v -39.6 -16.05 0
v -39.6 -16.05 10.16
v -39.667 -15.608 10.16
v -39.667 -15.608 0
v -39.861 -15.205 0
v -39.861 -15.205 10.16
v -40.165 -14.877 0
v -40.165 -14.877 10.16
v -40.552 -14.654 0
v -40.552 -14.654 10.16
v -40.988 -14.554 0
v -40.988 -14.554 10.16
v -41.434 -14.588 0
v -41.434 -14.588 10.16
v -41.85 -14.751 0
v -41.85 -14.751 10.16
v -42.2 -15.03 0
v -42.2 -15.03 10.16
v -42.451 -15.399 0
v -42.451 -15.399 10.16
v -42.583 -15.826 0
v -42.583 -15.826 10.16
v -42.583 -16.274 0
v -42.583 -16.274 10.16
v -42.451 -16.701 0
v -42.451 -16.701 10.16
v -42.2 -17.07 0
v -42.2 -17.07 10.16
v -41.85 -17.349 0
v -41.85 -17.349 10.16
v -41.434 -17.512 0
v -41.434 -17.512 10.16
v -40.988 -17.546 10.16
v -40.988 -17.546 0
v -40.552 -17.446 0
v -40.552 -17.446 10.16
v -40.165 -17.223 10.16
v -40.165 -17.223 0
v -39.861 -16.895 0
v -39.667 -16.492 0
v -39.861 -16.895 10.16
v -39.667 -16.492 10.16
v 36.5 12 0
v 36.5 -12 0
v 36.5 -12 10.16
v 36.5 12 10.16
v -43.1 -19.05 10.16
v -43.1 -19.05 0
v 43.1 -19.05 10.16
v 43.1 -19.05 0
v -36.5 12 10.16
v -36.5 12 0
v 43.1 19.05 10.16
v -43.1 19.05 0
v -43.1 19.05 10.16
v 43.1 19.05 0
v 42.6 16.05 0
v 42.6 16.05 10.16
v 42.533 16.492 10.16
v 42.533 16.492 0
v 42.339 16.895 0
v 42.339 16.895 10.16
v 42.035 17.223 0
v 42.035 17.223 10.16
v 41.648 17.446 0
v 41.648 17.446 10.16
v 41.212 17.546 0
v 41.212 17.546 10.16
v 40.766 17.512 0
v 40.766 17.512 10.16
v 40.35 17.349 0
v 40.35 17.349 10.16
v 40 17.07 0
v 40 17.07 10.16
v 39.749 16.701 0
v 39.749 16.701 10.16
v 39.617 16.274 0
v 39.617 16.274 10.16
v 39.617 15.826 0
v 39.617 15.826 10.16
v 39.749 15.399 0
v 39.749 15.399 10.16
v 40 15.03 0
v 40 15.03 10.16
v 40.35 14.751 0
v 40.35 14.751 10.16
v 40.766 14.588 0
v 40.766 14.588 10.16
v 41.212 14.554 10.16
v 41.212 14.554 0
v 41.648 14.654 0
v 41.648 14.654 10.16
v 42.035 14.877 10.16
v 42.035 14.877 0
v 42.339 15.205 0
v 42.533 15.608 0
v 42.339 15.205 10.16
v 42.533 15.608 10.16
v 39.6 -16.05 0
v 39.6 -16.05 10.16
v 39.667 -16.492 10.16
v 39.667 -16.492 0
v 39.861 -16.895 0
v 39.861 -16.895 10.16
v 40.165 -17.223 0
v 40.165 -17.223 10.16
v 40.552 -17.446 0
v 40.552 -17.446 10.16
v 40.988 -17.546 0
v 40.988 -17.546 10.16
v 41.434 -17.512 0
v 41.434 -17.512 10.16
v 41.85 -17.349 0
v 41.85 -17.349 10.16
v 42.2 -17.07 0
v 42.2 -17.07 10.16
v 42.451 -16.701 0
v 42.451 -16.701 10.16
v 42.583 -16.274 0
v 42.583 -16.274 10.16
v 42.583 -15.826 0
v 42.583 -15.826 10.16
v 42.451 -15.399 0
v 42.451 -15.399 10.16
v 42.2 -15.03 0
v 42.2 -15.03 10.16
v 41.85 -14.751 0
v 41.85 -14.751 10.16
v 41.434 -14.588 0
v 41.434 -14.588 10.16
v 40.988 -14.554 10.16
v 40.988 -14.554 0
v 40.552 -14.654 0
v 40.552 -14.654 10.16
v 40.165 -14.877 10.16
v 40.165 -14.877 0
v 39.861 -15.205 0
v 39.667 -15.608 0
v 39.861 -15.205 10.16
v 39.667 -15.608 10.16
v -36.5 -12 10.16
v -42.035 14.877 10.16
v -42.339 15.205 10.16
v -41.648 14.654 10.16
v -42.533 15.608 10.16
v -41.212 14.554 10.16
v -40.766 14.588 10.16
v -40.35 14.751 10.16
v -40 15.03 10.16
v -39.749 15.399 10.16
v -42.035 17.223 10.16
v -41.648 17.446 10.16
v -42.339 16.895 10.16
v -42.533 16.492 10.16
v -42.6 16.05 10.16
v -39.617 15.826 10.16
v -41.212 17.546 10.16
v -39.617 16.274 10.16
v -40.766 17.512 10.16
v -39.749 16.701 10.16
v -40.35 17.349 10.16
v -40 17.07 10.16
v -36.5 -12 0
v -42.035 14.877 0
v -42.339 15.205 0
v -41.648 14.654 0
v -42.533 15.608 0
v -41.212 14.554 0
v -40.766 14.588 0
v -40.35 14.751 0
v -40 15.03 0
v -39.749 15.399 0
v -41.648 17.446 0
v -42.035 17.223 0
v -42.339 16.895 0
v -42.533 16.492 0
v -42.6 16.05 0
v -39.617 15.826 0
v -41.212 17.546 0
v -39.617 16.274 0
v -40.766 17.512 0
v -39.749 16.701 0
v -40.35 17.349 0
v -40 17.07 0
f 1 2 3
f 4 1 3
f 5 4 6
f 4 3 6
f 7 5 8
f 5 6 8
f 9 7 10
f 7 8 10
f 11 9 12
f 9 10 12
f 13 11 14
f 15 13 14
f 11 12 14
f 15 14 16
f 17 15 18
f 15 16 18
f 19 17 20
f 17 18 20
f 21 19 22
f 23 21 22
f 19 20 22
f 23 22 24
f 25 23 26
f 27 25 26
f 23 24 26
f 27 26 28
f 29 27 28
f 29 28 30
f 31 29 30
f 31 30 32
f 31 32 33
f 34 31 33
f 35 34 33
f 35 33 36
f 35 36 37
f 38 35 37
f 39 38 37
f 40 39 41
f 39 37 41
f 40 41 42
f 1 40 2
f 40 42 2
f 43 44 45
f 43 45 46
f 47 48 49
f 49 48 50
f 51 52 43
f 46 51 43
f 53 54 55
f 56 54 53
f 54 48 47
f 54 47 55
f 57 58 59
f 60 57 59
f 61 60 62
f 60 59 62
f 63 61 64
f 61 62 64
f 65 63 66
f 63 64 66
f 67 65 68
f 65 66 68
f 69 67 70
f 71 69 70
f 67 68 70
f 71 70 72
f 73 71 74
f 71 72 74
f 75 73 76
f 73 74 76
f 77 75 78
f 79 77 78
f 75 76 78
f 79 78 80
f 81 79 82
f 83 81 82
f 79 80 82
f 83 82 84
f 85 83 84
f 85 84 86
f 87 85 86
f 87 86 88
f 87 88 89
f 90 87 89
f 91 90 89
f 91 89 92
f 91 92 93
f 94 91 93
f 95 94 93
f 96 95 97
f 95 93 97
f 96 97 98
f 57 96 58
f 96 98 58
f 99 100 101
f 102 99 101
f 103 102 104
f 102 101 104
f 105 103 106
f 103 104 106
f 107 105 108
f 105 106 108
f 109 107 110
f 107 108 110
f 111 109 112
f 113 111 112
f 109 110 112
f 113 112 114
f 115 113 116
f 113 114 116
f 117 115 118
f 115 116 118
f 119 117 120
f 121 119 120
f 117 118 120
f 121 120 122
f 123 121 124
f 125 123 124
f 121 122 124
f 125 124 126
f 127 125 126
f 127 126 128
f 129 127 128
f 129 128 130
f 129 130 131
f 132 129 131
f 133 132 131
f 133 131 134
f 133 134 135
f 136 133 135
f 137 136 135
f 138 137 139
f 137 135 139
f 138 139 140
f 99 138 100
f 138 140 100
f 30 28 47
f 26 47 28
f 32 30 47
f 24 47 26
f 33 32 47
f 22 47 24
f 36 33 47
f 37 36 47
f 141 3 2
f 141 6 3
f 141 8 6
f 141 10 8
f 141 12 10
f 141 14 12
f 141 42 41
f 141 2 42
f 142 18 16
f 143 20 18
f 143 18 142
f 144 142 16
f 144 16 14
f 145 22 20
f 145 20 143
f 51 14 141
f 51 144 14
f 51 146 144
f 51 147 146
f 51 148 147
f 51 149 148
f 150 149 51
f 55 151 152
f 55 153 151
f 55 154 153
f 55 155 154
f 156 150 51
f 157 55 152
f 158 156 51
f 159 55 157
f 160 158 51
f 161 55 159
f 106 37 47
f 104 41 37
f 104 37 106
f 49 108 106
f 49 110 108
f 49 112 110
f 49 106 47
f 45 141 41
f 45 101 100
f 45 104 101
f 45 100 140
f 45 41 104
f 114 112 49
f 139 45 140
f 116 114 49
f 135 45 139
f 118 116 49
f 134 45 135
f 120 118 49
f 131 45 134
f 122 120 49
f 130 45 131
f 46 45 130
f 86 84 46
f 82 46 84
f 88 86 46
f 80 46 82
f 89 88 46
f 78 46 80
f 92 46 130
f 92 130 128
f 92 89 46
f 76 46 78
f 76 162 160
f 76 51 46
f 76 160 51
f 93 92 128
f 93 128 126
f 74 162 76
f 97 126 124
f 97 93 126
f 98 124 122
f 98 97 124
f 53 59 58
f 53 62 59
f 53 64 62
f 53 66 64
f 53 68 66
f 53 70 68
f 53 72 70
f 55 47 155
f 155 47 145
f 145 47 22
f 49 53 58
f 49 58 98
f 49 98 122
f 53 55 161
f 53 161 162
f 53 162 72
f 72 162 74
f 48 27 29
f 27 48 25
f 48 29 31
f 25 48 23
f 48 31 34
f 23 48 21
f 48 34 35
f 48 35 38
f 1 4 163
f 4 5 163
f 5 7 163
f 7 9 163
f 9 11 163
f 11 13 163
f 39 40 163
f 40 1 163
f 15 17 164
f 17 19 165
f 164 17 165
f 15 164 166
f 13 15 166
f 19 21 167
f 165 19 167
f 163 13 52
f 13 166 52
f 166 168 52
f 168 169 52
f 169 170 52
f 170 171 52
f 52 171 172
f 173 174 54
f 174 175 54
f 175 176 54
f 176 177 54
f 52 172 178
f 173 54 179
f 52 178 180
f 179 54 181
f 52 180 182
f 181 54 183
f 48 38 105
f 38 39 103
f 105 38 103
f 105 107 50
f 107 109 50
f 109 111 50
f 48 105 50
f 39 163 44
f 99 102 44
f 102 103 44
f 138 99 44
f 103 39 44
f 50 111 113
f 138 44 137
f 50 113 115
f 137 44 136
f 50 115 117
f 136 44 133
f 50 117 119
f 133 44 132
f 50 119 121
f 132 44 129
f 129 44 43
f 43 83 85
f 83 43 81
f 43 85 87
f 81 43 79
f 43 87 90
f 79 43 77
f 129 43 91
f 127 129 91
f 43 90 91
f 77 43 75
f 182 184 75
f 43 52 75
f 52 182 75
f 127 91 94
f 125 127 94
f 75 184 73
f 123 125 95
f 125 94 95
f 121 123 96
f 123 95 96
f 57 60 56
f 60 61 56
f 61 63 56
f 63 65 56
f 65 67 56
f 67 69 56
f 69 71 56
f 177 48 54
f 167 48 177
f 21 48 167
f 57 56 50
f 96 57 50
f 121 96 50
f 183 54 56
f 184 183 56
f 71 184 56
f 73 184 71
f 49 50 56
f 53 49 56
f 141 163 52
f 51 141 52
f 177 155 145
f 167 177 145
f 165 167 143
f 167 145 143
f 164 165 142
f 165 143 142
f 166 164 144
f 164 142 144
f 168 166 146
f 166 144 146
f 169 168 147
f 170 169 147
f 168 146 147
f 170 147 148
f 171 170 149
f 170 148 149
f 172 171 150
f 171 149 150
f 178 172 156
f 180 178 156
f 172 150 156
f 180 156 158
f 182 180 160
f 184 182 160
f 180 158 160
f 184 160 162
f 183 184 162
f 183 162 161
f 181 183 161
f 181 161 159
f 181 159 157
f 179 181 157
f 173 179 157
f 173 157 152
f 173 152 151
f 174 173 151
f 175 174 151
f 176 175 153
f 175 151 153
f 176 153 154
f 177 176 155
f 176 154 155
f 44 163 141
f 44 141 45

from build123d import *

# Parameters (mm, degrees)
SKETCH1_W           = 86.199999926
SKETCH1_H           = 38.1
SKETCH1_W_2         = 73
SKETCH1_H_2         = 24
BOSS_EXTRUDE1_DEPTH = 10.16
SKETCH2_R           = 1.5
CUT_EXTRUDE1_DEPTH  = 10.16


with BuildPart() as part:
    # Sketch1 → Boss-Extrude1 (new body)
    with BuildSketch(Plane.XY):
        Rectangle(SKETCH1_W, SKETCH1_H)
        Rectangle(SKETCH1_W_2, SKETCH1_H_2, mode=Mode.SUBTRACT)
    extrude(amount=BOSS_EXTRUDE1_DEPTH)

    # Sketch2 → Cut-Extrude1 (cut)
    with BuildSketch(Plane.XY.offset(10.16)):
        with Locations((41.099999963, 16.05)):
            Circle(SKETCH2_R)
        with Locations(Location((-41.099999963, 16.05, 0), (0, 0, 180))):
            Circle(SKETCH2_R)
        with Locations((-41.099999963, -16.05)):
            Circle(SKETCH2_R)
        with Locations(Location((41.099999963, -16.05, 0), (0, 0, 180))):
            Circle(SKETCH2_R)
    extrude(amount=-CUT_EXTRUDE1_DEPTH, mode=Mode.SUBTRACT)


solid = part.part
